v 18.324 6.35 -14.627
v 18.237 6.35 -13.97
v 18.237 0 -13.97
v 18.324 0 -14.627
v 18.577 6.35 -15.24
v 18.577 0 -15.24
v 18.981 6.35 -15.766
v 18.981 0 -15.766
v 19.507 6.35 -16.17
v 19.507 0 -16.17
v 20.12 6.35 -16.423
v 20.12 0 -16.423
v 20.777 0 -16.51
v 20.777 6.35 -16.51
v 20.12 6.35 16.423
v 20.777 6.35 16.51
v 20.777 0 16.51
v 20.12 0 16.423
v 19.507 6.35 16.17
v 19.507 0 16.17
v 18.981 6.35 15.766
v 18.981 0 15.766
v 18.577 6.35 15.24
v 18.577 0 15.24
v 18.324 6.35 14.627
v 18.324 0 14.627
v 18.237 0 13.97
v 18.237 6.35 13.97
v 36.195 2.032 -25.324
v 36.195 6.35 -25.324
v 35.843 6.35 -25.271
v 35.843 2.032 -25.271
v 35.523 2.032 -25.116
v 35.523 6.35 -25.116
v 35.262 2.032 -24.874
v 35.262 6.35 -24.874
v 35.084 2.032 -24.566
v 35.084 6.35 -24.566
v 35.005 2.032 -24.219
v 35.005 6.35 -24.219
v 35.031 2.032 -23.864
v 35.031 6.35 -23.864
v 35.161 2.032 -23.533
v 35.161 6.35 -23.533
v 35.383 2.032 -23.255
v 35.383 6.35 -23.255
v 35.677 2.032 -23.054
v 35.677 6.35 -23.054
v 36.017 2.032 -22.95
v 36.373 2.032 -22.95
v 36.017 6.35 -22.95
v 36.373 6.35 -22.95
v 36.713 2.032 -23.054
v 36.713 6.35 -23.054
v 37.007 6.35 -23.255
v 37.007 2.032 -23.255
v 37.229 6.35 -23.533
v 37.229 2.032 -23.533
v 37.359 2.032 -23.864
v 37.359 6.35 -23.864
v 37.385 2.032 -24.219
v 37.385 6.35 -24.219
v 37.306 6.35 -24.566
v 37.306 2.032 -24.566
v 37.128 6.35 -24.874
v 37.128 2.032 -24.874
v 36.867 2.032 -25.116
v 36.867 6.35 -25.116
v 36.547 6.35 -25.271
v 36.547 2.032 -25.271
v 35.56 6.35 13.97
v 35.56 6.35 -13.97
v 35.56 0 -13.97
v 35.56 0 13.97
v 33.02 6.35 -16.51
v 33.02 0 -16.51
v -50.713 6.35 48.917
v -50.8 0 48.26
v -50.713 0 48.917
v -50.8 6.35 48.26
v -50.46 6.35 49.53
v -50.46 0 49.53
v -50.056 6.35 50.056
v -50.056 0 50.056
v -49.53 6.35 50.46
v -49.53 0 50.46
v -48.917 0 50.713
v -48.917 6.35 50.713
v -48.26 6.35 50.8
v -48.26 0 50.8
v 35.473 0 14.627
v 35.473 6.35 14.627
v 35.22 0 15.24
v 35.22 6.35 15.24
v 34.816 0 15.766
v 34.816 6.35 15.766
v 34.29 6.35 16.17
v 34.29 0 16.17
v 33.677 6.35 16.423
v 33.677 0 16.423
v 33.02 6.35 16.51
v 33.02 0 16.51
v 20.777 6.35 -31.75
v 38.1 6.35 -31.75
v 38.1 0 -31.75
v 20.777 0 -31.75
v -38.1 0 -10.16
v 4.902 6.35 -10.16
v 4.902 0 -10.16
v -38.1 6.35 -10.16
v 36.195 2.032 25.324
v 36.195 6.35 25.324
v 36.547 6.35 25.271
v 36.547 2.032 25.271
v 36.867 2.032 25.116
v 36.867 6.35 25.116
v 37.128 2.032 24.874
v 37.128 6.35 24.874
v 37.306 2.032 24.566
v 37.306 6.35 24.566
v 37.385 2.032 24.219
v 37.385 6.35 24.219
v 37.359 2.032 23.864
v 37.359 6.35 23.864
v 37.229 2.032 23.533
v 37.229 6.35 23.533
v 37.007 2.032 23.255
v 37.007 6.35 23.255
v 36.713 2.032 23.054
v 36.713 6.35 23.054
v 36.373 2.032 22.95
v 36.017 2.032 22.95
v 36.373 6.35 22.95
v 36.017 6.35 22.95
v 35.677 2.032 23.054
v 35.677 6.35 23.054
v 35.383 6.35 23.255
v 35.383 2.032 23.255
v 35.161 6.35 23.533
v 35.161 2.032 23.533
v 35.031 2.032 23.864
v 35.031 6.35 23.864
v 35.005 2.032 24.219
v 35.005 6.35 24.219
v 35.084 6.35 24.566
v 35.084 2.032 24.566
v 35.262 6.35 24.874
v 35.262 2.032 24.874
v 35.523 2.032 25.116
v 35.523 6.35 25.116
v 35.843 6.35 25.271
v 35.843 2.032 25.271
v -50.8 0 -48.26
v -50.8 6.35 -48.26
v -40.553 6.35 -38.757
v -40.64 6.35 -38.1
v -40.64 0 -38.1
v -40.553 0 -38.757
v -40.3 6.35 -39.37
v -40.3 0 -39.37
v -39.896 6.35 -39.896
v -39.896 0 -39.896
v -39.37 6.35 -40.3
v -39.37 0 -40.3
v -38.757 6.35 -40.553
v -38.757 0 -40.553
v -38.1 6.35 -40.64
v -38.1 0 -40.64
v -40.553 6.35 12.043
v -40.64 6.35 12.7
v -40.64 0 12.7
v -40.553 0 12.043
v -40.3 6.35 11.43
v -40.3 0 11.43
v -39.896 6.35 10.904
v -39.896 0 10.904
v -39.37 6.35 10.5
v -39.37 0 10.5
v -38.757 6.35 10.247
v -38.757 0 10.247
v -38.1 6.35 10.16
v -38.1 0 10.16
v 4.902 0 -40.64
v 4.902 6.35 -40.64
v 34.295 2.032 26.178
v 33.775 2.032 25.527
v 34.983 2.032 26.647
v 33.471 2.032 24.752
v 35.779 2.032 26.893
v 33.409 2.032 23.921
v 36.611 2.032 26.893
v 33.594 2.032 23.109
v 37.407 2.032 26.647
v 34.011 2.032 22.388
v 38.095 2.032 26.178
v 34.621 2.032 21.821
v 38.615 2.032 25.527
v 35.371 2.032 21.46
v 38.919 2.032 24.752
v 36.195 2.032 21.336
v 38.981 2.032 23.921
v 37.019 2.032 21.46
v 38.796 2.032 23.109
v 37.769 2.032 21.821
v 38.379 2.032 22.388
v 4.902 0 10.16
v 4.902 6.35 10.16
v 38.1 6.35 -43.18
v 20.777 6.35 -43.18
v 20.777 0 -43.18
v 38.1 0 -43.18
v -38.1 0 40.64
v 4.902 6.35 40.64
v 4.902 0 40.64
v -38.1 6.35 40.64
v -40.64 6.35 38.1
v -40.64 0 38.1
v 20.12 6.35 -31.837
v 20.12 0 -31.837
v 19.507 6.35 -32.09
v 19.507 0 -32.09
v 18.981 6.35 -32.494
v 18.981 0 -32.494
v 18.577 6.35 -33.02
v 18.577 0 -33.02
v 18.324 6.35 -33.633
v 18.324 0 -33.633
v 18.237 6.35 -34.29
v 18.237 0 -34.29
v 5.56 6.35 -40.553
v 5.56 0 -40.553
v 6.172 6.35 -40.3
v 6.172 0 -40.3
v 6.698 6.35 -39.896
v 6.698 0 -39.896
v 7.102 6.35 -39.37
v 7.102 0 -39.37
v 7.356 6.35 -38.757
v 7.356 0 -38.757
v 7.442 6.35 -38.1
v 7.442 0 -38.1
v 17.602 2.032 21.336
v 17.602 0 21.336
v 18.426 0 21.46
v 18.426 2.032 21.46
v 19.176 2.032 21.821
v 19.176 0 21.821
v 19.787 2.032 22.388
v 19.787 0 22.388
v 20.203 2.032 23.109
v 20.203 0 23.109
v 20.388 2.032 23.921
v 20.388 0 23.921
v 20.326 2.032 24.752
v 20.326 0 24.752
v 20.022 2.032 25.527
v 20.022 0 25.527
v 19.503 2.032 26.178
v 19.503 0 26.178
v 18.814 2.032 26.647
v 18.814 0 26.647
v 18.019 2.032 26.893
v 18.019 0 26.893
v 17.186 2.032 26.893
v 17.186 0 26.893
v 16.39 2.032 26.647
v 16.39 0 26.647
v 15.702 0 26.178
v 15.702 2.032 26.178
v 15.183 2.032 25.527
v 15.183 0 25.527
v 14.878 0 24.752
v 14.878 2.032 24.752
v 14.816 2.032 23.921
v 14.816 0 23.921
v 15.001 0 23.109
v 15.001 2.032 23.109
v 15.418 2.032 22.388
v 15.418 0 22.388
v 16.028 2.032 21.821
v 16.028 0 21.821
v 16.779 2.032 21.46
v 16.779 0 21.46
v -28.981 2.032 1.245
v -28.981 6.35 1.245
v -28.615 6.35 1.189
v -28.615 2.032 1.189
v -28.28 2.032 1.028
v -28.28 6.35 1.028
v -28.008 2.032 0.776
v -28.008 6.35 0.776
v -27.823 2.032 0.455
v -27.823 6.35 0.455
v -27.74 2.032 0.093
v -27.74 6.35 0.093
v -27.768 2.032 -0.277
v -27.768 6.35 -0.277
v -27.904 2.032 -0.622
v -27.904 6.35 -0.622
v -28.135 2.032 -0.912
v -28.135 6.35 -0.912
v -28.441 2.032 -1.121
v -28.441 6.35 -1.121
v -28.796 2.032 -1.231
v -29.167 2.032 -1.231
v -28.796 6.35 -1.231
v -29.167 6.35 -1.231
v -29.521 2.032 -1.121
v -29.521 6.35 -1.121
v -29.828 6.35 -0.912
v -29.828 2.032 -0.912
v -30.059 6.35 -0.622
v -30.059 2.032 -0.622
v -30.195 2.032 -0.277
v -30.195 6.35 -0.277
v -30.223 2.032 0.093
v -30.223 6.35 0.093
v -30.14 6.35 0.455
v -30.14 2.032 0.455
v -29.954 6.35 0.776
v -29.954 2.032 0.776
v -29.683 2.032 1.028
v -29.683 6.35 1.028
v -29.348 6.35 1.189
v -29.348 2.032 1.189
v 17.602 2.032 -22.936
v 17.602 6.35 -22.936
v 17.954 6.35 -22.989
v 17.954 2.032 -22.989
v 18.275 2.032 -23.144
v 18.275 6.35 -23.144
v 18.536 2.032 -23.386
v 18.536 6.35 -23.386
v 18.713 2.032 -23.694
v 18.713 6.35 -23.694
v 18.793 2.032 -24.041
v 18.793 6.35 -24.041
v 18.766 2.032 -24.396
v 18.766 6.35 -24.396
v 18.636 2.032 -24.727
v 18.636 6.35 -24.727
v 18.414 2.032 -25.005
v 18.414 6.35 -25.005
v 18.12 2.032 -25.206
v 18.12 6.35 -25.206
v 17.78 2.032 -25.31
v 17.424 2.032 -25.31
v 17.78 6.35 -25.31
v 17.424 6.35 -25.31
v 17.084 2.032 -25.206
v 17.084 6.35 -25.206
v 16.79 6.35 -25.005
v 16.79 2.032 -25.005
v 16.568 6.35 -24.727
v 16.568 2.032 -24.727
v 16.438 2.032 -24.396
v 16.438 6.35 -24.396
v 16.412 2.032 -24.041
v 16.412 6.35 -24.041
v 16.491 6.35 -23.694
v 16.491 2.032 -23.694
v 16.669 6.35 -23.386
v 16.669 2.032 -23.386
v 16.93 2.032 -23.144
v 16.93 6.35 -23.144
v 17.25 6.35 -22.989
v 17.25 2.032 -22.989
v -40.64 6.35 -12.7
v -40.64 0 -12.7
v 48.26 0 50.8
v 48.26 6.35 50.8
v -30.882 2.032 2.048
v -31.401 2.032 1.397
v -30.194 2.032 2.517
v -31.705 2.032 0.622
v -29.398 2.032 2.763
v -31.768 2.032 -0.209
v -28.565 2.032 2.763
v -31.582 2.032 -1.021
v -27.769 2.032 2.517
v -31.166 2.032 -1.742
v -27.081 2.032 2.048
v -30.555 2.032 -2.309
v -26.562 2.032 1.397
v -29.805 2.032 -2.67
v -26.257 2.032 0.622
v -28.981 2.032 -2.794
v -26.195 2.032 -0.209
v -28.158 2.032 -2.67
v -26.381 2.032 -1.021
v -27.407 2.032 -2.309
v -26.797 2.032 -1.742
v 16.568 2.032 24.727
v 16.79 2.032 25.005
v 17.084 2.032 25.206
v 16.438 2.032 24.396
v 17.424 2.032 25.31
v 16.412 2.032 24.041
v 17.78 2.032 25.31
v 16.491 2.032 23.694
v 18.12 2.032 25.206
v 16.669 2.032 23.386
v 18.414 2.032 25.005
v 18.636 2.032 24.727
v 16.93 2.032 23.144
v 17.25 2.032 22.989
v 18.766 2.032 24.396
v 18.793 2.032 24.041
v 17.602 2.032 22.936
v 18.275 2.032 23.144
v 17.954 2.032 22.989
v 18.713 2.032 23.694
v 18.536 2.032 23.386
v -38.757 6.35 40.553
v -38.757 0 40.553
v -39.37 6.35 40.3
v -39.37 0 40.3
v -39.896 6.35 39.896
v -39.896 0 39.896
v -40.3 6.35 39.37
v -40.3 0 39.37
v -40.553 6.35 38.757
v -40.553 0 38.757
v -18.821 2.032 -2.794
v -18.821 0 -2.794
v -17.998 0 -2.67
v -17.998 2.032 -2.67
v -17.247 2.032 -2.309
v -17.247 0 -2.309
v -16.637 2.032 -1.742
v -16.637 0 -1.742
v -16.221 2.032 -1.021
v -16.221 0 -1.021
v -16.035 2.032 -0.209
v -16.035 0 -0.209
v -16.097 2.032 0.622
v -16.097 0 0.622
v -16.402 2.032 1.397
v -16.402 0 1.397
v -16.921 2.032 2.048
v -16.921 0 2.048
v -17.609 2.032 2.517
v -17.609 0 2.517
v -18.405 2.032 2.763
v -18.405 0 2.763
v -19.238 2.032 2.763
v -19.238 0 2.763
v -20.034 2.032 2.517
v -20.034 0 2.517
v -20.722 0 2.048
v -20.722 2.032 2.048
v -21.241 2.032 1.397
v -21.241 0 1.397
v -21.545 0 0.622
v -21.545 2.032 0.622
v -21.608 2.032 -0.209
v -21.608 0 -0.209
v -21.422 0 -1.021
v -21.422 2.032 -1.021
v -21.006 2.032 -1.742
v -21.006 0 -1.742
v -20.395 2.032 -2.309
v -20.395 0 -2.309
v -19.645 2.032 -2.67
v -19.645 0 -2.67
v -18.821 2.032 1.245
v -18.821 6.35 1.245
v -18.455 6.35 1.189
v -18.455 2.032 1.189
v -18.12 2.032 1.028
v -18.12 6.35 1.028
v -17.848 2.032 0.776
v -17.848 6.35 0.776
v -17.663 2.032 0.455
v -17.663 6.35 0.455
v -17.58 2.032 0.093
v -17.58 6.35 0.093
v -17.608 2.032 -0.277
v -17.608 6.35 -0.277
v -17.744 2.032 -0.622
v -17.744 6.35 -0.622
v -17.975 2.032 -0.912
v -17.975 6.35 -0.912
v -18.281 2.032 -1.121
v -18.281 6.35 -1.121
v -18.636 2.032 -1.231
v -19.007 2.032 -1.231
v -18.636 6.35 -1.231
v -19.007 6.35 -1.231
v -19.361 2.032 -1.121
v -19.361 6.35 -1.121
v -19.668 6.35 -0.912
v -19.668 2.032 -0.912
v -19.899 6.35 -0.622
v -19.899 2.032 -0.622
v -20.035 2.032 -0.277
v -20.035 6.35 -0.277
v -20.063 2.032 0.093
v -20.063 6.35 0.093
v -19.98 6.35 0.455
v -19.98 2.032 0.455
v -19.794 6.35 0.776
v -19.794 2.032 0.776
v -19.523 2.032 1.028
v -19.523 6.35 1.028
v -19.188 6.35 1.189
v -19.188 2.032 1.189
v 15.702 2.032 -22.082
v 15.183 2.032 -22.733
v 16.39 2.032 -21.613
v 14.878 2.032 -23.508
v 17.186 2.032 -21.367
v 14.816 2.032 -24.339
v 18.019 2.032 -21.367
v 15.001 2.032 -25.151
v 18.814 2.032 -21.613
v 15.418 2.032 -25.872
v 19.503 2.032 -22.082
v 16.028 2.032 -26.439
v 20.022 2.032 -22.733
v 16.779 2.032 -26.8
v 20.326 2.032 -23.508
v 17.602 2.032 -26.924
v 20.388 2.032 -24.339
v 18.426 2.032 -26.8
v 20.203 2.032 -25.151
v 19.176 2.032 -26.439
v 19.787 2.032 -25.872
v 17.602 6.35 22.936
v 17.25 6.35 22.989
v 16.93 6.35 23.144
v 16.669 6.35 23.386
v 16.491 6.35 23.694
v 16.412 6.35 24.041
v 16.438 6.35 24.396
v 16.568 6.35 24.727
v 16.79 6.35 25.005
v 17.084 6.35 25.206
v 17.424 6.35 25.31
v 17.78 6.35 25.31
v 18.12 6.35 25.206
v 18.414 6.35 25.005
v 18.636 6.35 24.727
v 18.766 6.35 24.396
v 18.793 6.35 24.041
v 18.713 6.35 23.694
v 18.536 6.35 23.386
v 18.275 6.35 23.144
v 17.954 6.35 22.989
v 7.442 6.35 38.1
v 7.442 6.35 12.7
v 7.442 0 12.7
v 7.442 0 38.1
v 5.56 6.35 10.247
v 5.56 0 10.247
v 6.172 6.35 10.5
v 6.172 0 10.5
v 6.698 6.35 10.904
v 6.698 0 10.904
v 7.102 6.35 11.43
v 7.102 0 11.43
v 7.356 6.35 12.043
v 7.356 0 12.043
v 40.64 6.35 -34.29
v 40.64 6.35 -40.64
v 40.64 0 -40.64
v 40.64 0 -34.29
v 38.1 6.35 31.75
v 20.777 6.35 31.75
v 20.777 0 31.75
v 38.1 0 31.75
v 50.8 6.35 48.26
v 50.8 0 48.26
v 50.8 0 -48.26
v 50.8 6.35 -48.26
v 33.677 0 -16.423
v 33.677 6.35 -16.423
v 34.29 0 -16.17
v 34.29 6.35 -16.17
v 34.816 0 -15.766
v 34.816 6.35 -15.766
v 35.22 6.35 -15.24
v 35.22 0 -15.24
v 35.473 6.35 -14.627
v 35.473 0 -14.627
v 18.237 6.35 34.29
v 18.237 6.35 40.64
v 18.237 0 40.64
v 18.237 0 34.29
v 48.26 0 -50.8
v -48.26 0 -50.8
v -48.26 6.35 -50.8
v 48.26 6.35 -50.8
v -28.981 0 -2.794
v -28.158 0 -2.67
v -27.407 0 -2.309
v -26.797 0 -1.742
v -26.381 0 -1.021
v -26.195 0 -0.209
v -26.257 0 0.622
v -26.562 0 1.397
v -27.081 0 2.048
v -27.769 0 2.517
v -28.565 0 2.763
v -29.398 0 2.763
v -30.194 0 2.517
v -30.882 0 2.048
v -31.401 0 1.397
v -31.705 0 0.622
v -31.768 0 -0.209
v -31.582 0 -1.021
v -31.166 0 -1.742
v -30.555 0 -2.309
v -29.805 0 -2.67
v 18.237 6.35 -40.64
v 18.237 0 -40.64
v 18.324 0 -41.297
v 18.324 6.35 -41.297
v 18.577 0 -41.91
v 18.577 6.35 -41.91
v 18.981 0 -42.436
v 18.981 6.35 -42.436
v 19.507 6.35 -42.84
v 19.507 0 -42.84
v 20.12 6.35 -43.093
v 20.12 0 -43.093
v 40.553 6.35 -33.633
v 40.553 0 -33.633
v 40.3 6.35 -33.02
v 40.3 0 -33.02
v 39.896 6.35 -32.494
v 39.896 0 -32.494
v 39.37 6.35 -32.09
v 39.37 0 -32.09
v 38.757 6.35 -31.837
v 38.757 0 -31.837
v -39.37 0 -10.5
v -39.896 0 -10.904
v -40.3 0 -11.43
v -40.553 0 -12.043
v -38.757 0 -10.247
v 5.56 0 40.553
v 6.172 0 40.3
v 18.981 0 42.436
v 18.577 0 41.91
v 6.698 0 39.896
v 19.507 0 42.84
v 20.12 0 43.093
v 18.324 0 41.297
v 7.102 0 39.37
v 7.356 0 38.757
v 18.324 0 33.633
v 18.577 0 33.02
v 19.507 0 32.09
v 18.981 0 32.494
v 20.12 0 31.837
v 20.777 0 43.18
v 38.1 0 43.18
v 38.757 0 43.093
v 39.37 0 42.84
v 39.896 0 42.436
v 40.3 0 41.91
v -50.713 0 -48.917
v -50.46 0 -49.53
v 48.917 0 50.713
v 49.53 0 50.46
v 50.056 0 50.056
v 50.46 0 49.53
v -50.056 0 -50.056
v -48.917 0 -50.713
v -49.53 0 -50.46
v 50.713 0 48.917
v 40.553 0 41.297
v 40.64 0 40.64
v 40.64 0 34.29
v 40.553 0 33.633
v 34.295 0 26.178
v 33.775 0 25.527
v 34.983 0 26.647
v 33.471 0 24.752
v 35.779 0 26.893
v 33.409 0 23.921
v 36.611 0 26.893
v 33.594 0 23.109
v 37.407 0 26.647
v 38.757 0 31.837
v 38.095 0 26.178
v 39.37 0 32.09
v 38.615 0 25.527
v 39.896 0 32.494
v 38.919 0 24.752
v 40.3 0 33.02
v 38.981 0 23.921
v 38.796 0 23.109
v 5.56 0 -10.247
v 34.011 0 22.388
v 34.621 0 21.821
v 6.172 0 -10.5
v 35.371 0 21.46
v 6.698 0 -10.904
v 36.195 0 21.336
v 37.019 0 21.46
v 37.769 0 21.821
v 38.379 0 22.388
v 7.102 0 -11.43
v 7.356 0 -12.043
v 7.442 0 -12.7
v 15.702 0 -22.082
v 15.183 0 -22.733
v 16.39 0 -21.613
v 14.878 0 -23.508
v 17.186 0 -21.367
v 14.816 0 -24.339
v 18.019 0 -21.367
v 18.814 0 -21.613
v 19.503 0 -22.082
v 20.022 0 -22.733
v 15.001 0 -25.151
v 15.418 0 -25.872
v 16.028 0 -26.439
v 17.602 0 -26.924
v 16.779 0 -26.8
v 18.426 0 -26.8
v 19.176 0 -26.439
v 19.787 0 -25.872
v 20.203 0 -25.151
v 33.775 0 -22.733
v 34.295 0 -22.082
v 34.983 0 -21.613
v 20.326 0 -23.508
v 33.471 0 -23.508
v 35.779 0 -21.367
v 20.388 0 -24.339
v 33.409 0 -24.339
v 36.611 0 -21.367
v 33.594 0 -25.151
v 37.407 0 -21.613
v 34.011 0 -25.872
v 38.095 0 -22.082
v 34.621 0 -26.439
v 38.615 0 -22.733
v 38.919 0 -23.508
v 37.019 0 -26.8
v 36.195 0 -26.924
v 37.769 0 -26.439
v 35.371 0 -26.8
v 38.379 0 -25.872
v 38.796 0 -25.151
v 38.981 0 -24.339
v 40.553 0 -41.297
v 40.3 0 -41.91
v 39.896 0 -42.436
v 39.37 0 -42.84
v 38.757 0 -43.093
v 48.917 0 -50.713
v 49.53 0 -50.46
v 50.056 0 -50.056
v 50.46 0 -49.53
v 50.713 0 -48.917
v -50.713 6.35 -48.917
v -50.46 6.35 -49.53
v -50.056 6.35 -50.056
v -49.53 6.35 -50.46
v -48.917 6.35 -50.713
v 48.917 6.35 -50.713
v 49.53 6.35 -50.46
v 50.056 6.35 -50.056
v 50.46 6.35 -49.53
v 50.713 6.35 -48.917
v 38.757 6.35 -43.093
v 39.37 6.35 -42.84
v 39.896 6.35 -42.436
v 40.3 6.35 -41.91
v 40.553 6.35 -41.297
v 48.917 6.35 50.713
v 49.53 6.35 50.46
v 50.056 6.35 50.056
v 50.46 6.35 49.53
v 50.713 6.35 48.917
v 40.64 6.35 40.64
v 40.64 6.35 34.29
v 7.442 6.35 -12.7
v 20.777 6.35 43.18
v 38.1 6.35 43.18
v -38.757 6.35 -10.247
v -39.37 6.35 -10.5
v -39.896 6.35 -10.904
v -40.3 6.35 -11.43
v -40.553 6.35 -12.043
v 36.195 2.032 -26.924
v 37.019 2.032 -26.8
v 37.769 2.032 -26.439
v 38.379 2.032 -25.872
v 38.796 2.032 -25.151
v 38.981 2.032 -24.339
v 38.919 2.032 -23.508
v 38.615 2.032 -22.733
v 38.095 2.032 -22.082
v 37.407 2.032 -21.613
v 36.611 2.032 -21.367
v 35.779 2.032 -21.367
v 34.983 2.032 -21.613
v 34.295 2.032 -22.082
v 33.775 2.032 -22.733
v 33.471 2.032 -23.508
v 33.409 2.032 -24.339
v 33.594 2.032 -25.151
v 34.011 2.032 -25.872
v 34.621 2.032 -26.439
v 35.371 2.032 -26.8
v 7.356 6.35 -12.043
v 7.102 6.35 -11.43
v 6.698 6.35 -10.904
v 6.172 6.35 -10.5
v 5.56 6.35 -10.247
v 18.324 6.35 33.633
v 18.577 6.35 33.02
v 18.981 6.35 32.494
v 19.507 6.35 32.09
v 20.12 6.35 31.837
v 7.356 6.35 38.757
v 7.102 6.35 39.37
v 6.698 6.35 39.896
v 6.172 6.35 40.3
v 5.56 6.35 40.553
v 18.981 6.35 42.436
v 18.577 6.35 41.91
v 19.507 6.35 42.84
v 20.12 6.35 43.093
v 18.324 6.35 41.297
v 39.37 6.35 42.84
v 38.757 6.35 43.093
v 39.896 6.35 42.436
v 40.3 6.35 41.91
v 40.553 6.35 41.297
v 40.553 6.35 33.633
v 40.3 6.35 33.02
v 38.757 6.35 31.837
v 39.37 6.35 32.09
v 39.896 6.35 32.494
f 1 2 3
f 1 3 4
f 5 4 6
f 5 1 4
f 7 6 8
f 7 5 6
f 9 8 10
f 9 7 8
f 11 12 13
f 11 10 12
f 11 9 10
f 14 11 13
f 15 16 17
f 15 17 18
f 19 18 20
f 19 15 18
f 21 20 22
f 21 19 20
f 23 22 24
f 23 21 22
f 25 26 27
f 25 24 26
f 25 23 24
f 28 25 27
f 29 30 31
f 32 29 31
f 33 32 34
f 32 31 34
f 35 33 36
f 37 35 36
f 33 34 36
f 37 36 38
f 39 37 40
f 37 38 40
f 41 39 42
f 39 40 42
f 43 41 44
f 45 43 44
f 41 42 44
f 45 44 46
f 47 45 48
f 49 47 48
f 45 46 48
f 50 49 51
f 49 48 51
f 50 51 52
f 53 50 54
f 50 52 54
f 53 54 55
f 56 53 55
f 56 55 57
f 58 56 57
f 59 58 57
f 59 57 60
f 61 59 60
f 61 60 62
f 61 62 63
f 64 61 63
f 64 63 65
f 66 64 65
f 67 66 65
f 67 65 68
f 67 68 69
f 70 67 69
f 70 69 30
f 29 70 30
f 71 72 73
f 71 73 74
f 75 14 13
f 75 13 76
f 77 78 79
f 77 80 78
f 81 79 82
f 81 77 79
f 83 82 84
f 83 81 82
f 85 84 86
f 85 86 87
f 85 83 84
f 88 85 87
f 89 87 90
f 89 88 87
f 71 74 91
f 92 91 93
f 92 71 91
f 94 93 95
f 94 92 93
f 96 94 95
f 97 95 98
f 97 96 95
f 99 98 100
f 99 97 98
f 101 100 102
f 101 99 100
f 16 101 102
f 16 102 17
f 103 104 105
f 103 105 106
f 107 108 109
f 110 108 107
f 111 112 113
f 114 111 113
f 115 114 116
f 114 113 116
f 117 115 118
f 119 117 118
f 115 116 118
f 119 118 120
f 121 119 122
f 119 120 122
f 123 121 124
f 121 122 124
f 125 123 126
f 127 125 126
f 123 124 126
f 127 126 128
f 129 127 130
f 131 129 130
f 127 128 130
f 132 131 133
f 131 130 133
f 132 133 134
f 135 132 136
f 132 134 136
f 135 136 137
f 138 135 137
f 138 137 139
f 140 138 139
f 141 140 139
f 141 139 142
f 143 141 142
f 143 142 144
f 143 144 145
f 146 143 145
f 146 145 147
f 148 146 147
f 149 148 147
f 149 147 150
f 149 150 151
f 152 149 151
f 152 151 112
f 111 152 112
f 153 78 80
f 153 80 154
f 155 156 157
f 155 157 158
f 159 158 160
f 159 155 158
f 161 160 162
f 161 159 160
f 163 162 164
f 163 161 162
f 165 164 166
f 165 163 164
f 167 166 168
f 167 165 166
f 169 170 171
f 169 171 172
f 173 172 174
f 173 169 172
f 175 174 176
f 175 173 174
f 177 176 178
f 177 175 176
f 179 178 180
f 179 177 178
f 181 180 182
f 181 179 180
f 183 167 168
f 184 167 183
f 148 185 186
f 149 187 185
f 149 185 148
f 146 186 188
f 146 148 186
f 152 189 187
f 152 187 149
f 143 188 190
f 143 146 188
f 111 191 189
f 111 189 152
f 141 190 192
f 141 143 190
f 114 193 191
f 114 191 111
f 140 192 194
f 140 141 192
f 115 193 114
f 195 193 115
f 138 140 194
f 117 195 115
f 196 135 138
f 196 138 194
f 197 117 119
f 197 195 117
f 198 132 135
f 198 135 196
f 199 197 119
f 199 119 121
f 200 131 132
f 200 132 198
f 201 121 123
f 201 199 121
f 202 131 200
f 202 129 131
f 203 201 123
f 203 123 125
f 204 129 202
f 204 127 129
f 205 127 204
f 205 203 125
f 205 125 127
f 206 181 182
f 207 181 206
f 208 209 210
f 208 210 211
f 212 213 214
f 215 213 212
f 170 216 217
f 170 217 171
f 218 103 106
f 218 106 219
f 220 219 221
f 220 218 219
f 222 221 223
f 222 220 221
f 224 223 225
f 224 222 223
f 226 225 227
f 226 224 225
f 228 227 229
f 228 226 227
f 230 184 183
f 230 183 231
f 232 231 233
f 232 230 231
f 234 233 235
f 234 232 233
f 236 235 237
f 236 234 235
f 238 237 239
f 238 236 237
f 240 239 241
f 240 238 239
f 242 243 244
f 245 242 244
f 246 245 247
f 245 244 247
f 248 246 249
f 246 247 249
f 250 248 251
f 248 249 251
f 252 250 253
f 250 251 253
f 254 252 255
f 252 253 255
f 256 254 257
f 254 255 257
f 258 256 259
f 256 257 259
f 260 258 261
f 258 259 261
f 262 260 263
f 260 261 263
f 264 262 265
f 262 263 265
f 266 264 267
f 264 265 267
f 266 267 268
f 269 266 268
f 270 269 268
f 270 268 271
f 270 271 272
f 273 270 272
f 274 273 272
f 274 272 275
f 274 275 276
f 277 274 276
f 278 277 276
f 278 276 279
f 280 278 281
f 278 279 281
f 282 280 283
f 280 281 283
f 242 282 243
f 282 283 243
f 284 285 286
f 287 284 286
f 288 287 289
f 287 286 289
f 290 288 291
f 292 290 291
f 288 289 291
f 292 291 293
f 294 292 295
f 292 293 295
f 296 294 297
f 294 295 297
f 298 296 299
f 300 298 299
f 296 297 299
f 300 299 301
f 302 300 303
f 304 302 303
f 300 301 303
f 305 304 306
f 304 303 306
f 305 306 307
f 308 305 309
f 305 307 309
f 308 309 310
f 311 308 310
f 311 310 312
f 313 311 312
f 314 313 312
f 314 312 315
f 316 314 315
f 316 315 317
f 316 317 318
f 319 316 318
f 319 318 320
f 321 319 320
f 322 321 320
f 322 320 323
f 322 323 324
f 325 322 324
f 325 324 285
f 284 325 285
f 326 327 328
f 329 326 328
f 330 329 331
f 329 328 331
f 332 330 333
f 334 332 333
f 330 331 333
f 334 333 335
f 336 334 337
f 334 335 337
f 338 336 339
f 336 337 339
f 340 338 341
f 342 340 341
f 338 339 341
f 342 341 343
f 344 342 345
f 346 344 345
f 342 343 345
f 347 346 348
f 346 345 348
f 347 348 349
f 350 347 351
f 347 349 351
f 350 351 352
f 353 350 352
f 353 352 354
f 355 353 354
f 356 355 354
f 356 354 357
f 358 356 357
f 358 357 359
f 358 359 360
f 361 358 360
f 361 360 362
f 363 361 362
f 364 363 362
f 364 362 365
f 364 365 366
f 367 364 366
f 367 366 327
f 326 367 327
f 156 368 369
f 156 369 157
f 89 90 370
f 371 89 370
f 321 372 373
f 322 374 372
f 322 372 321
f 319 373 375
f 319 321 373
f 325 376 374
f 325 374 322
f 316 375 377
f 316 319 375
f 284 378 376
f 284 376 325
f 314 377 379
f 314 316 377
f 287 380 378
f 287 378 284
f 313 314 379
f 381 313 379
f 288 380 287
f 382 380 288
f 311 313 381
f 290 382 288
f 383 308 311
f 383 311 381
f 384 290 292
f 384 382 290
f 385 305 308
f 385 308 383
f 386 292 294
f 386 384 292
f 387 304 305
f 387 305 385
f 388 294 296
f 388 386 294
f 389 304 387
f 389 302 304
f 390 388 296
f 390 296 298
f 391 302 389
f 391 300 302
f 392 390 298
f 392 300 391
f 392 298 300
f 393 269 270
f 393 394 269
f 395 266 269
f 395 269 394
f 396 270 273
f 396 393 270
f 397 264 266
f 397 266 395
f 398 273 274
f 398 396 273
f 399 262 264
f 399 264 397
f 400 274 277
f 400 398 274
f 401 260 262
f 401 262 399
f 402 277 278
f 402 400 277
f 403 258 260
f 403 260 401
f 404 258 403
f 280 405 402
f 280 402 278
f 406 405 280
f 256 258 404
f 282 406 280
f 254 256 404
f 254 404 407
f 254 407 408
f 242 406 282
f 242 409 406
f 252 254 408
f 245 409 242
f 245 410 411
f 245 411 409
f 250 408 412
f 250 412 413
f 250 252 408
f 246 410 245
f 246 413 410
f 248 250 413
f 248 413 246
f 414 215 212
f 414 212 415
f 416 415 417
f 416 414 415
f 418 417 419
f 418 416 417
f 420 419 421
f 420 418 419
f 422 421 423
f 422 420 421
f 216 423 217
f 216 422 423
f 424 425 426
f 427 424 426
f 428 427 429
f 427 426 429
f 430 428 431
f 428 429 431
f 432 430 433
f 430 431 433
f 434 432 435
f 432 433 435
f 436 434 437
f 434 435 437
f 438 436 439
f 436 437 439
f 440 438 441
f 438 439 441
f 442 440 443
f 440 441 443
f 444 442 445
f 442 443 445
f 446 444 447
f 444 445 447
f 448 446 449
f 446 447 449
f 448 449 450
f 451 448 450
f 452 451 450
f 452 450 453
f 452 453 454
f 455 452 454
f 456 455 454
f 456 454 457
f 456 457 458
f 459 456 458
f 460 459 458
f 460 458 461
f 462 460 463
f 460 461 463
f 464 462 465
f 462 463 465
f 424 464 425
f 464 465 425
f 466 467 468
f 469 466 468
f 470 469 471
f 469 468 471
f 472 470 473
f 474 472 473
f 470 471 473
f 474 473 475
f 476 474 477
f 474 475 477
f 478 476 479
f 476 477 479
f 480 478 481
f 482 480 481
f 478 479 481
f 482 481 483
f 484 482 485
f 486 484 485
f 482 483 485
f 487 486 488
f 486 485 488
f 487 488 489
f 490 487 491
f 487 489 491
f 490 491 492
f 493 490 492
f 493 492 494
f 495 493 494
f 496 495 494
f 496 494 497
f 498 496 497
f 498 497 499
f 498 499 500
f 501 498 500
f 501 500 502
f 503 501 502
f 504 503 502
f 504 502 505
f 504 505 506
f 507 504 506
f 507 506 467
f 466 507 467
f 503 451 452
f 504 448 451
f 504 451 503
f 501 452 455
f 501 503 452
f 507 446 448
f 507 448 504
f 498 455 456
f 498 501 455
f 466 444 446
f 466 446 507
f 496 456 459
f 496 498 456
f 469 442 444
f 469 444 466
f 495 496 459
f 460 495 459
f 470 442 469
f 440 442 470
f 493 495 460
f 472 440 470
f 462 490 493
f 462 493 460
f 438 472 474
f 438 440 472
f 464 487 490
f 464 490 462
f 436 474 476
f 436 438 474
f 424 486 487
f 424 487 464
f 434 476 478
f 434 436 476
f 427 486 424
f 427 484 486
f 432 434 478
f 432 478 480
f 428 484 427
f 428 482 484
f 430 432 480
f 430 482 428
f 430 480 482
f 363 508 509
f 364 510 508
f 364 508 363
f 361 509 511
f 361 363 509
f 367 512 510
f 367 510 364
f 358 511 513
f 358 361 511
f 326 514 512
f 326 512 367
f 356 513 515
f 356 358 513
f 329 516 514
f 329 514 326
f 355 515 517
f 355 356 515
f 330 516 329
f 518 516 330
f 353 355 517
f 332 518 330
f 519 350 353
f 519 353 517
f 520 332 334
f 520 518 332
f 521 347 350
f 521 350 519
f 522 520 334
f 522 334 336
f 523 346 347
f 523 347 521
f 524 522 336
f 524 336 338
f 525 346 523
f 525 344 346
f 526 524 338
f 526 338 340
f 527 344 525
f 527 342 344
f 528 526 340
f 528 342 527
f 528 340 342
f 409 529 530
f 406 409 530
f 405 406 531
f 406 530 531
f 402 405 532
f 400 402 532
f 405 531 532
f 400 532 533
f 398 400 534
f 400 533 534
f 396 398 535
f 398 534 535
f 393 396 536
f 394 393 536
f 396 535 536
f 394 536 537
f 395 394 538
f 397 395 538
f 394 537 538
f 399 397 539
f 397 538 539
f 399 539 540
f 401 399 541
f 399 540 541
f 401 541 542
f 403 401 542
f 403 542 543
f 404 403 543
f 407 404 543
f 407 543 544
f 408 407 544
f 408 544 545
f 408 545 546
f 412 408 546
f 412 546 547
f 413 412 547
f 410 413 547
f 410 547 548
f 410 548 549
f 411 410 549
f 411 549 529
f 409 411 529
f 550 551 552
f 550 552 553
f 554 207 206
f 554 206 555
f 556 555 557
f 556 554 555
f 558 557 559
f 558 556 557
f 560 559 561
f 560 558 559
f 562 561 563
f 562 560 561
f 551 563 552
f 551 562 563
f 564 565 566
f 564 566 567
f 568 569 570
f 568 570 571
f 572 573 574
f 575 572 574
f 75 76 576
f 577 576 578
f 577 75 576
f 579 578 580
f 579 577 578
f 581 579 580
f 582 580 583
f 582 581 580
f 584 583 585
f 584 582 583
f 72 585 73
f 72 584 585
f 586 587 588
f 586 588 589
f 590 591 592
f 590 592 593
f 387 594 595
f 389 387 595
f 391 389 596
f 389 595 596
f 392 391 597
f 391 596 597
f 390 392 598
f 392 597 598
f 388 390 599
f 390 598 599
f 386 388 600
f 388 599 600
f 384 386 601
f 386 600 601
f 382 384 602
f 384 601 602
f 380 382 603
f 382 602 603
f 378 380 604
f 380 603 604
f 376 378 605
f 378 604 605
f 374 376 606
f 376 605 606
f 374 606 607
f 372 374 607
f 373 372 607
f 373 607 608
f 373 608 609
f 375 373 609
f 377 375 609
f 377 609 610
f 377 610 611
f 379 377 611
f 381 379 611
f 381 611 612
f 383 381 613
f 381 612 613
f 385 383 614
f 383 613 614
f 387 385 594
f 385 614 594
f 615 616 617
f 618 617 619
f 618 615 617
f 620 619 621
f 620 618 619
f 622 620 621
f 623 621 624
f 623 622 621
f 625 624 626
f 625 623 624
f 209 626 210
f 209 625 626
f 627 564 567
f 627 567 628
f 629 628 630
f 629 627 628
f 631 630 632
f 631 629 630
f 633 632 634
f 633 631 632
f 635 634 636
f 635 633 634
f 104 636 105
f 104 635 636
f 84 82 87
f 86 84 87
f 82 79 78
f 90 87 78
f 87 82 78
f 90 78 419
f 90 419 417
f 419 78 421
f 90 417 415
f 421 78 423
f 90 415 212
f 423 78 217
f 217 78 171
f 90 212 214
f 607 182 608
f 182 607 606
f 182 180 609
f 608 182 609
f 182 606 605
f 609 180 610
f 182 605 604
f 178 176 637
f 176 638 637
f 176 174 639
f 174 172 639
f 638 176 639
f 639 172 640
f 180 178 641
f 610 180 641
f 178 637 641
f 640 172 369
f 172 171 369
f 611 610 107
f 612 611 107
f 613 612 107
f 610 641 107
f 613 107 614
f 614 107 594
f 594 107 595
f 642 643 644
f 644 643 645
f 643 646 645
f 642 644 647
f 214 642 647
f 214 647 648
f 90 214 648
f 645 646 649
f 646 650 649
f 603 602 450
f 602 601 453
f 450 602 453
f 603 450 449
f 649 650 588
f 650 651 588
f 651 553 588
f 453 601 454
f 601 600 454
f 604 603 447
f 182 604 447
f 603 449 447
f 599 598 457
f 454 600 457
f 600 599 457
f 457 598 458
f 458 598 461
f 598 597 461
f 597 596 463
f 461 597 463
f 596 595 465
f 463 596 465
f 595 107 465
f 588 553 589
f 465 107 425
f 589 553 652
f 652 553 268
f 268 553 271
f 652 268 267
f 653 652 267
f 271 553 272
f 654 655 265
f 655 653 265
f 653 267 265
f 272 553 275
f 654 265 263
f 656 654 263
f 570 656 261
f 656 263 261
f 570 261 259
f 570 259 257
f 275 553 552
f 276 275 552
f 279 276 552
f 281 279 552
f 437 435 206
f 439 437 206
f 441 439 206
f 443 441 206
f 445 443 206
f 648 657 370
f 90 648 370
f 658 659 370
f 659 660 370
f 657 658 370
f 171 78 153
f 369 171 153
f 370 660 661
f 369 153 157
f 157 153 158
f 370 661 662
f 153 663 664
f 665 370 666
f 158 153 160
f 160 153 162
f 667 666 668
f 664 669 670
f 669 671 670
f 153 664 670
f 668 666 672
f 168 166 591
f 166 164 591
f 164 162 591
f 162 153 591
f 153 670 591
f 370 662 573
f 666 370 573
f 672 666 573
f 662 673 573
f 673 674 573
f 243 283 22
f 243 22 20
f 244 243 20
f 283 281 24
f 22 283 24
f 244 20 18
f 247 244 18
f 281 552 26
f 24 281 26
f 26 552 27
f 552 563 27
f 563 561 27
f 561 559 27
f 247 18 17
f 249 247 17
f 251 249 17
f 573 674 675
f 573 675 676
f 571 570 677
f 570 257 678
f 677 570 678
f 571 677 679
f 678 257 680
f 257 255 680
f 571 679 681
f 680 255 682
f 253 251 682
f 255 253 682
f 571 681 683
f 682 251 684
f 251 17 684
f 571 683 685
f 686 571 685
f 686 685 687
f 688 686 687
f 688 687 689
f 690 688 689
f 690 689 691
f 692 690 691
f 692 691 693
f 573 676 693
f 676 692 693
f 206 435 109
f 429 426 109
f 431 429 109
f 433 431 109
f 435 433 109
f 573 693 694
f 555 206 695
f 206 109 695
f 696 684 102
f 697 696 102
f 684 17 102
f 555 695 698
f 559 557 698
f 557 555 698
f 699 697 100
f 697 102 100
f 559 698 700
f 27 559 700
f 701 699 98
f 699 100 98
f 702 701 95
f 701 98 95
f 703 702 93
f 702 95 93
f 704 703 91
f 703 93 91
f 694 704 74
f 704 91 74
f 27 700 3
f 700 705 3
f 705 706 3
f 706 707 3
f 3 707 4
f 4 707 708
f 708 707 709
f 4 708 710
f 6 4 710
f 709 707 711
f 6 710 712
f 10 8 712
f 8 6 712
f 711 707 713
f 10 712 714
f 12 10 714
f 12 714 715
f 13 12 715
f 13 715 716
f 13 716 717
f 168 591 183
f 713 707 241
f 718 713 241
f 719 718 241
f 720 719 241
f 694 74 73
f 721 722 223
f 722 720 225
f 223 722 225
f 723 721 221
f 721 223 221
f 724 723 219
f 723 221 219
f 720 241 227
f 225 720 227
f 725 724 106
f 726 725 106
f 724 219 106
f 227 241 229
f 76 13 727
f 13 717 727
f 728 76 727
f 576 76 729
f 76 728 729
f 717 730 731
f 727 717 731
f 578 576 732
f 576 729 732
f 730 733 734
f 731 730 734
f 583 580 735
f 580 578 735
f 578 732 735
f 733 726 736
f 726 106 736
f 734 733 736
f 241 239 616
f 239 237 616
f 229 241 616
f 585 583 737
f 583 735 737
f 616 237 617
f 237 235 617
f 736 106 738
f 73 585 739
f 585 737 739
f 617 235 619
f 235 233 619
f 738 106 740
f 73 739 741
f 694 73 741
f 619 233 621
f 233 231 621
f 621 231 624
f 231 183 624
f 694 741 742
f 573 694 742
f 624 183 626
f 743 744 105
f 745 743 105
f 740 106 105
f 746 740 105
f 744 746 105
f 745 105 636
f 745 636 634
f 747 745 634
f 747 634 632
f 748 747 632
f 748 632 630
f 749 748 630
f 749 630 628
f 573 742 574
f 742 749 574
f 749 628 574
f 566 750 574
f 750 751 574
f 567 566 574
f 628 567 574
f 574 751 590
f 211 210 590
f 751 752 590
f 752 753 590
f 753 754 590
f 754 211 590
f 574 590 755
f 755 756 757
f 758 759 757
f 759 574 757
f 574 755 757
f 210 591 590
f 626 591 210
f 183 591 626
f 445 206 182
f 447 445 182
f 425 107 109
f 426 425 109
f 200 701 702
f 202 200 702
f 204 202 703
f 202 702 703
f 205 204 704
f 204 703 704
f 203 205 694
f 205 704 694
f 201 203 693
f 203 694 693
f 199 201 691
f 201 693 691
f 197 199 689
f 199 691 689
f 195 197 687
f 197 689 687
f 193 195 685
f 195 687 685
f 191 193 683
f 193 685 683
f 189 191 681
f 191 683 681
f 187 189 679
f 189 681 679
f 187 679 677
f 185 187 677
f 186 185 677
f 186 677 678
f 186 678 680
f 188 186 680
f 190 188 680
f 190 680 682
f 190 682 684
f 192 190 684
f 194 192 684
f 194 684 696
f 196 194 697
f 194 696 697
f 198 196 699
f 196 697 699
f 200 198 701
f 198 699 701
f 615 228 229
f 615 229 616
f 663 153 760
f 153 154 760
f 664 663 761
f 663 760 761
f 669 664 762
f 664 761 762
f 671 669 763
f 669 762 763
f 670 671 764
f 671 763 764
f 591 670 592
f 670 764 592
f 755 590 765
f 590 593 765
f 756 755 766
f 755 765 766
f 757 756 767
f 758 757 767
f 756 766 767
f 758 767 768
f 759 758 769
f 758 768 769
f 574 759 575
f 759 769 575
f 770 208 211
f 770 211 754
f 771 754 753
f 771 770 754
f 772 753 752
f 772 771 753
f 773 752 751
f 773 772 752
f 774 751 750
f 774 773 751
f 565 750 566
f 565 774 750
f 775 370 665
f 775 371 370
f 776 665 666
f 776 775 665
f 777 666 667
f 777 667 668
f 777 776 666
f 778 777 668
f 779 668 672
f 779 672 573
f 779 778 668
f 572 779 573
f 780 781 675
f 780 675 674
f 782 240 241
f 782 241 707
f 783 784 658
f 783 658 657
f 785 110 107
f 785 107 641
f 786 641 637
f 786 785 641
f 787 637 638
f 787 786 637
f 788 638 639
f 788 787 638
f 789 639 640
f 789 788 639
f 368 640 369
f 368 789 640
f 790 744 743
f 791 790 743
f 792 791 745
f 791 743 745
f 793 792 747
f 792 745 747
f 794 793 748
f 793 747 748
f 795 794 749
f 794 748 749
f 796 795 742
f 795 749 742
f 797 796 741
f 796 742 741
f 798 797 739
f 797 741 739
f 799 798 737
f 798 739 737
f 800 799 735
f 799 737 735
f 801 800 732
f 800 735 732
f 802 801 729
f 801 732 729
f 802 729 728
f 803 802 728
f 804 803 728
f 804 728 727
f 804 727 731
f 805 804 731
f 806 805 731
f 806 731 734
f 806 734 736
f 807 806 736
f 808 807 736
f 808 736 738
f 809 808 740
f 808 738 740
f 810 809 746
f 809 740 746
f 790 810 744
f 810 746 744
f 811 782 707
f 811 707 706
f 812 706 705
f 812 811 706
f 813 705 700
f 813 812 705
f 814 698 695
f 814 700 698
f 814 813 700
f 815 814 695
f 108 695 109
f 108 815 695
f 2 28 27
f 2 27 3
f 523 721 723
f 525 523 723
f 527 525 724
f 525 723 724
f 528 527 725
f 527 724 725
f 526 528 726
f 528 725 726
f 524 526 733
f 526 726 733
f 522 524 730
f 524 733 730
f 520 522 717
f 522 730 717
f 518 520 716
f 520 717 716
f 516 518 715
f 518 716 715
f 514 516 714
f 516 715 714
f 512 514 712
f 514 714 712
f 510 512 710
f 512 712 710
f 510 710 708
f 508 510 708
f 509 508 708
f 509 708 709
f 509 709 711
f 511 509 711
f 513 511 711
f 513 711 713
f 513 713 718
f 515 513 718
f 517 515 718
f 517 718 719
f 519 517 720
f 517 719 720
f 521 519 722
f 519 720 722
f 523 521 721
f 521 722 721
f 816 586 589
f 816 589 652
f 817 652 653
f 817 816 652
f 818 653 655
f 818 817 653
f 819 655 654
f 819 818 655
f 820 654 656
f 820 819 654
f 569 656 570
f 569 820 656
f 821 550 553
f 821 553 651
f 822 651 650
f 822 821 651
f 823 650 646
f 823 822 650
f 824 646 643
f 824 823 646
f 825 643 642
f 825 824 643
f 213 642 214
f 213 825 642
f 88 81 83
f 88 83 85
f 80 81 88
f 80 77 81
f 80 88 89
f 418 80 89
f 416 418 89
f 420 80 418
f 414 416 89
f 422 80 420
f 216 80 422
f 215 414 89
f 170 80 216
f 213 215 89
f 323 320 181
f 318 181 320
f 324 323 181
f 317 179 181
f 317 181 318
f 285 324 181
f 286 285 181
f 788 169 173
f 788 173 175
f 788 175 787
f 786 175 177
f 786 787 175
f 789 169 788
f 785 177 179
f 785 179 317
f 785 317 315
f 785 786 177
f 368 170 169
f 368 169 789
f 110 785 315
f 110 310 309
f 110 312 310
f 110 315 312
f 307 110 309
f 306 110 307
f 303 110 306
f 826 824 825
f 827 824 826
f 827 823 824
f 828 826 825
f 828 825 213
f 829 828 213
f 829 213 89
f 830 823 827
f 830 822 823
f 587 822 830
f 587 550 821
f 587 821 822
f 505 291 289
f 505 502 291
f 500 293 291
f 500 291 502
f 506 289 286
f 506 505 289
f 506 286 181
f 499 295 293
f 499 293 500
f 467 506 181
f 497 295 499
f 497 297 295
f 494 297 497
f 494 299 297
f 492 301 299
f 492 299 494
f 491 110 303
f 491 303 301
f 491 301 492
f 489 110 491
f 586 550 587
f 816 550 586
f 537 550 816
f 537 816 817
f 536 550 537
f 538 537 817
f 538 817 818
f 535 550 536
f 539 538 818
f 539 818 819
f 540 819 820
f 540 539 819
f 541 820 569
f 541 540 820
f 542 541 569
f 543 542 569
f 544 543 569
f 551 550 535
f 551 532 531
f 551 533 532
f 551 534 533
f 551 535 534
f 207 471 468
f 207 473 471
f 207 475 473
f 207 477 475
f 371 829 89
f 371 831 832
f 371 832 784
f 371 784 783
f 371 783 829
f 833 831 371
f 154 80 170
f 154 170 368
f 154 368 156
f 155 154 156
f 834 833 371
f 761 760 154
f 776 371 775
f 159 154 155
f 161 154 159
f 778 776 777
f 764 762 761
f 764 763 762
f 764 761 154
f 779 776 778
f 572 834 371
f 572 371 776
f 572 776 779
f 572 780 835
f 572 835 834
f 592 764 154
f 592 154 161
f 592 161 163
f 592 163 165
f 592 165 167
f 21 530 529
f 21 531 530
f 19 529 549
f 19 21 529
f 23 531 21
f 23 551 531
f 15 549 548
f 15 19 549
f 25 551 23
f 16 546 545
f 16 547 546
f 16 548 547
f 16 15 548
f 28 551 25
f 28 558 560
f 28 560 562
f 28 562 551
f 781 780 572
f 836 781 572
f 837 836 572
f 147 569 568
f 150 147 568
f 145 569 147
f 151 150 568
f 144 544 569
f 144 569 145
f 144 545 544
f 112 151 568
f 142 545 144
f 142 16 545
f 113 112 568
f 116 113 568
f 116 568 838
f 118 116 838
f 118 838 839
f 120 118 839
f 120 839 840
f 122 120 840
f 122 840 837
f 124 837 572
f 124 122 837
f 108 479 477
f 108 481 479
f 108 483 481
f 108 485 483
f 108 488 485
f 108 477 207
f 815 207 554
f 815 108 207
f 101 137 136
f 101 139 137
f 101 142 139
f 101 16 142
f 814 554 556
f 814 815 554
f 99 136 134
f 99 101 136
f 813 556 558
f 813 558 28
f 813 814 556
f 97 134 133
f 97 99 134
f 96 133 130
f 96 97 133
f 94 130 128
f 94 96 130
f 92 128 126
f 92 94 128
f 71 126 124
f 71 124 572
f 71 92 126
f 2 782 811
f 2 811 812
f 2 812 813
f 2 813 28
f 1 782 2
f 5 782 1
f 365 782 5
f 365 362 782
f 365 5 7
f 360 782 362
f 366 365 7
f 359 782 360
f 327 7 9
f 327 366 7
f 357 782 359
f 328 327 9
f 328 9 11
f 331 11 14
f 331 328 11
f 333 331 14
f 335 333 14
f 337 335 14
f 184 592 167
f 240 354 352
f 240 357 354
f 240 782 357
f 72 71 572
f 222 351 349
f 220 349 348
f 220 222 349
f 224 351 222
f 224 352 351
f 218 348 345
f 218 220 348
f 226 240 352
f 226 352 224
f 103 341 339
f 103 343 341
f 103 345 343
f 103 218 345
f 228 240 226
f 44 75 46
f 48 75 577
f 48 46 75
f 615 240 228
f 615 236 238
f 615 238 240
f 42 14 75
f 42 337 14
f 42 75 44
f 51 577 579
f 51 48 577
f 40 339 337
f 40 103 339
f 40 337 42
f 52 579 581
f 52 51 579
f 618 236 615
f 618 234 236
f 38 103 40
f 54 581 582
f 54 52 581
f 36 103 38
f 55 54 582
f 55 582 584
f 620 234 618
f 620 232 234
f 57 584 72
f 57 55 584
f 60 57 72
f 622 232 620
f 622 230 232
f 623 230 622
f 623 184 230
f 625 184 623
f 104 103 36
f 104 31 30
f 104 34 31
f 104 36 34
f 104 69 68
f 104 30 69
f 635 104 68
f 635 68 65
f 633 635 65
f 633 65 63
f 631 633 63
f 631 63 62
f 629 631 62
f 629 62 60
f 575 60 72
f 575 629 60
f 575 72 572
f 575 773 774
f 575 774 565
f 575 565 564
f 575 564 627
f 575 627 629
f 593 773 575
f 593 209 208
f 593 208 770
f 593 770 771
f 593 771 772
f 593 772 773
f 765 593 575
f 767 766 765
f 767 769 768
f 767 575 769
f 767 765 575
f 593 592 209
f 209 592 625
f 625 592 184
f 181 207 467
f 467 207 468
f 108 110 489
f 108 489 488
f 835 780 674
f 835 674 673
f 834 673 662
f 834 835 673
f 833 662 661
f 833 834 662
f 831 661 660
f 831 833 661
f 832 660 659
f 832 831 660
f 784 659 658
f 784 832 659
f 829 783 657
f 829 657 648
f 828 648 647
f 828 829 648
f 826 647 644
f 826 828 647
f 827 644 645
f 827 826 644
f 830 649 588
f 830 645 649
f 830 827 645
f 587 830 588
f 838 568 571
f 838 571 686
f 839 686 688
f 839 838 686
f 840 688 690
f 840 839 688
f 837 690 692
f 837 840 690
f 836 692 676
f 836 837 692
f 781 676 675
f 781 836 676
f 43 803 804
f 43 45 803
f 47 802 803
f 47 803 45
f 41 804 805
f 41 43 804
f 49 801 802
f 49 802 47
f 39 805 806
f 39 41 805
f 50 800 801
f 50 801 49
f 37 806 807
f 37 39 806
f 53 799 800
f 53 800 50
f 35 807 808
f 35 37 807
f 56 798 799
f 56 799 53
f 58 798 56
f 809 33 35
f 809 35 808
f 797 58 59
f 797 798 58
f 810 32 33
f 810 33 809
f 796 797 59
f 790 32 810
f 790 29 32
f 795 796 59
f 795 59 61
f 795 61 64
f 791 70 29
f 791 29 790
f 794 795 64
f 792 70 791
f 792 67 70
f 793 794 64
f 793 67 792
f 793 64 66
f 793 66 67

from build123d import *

# Parameters (mm, degrees)
BASE_W              = 101.6
BASE_H              = 101.6
BOSS_EXTRUDE2_DEPTH = 6.35
SKETCH1_R           = 1.1938
SKETCH1_R_2         = 1.2446
CUT_EXTRUDE1_DEPTH  = 73.122135992
FILLET1_R           = 2.54
SKETCH2_R           = 2.794
CUT_EXTRUDE2_DEPTH  = 2.032
CUT_EXTRUDE3_DEPTH  = 73.122135992


with BuildPart() as part:
    # Base → Boss-Extrude2 (new body)
    with BuildSketch(Plane(origin=(0, 0, 0), x_dir=(1, 0, 0), z_dir=(0, 1, 0))):
        Rectangle(BASE_W, BASE_H)
    extrude(amount=BOSS_EXTRUDE2_DEPTH)

    # Sketch1 → Cut-Extrude1 (cut, through all)
    with BuildSketch(Plane(origin=(0, 6.35, 0), x_dir=(1, 0, 0), z_dir=(0, 1, 0))):
        with Locations(Location((17.6022, 24.13, 0), (0, 0, 270))):
            Circle(SKETCH1_R)
        with Locations(Location((36.195, 24.13, 0), (0, 0, 90))):
            Circle(SKETCH1_R)
        with Locations(Location((17.6022, -24.13, 0), (0, 0, 90))):
            Circle(SKETCH1_R)
        with Locations(Location((36.195, -24.13, 0), (0, 0, 270))):
            Circle(SKETCH1_R)
        with Locations(Location((-28.9814, 0, 0), (0, 0, 270))):
            Circle(SKETCH1_R_2)
        with Locations(Location((-18.8214, 0, 0), (0, 0, 270))):
            Circle(SKETCH1_R_2)
    extrude(amount=-CUT_EXTRUDE1_DEPTH, mode=Mode.SUBTRACT)

    # Fillet1
    fillet1_edges = [part.edges().sort_by_distance(p)[0] for p in [
        (50.8, 3.175, 50.8),
        (-50.8, 3.175, 50.8),
        (-50.8, 3.175, -50.8),
        (50.8, 3.175, -50.8),
    ]]
    fillet(fillet1_edges, radius=FILLET1_R)

    # Sketch2 → Cut-Extrude2 (cut)
    with BuildSketch(Plane.XZ):
        with Locations(Location((17.6022, 24.13, 0), (0, 0, 270))):
            Circle(SKETCH2_R)
        with Locations(Location((36.195, 24.13, 0), (0, 0, 270))):
            Circle(SKETCH2_R)
        with Locations(Location((36.195, -24.13, 0), (0, 0, 270))):
            Circle(SKETCH2_R)
        with Locations(Location((17.6022, -24.13, 0), (0, 0, 270))):
            Circle(SKETCH2_R)
        with Locations(Location((-18.8214, 0, 0), (0, 0, 270))):
            Circle(SKETCH2_R)
        with Locations(Location((-28.9814, 0, 0), (0, 0, 270))):
            Circle(SKETCH2_R)
    extrude(amount=-CUT_EXTRUDE2_DEPTH, mode=Mode.SUBTRACT)

    # Sketch3 → Cut-Extrude3 (cut, through all)
    with BuildSketch(Plane(origin=(0, 6.35, 0), x_dir=(1, 0, 0), z_dir=(0, 1, 0))):
        with BuildLine():
            Line((-38.1, -10.16), (4.9022, -10.16))
            ThreePointArc((4.9022, -10.16), (6.698251224, -10.903948776), (7.4422, -12.7))
            Line((7.4422, -12.7), (7.4422, -38.1))
            ThreePointArc((7.4422, -38.1), (6.698251224, -39.896051224), (4.9022, -40.64))
            Line((4.9022, -40.64), (-38.1, -40.64))
            ThreePointArc((-38.1, -40.64), (-39.896051224, -39.896051224), (-40.64, -38.1))
            Line((-40.64, -38.1), (-40.64, -12.7))
            ThreePointArc((-40.64, -12.7), (-39.896051224, -10.903948776), (-38.1, -10.16))
        make_face()
        with BuildLine():
            Line((-38.1, 40.64), (4.9022, 40.64))
            ThreePointArc((4.9022, 40.64), (6.698251224, 39.896051224), (7.4422, 38.1))
            Line((7.4422, 38.1), (7.4422, 12.7))
            ThreePointArc((7.4422, 12.7), (6.698251224, 10.903948776), (4.9022, 10.16))
            Line((4.9022, 10.16), (-38.1, 10.16))
            ThreePointArc((-38.1, 10.16), (-39.896051224, 10.903948776), (-40.64, 12.7))
            Line((-40.64, 12.7), (-40.64, 38.1))
            ThreePointArc((-40.64, 38.1), (-39.896051224, 39.896051224), (-38.1, 40.64))
        make_face()
        with BuildLine():
            Line((20.7772, 16.51), (33.02, 16.51))
            ThreePointArc((33.02, 16.51), (34.816051224, 15.766051224), (35.56, 13.97))
            Line((35.56, 13.97), (35.56, -13.97))
            ThreePointArc((35.56, -13.97), (34.816051224, -15.766051224), (33.02, -16.51))
            Line((33.02, -16.51), (20.7772, -16.51))
            ThreePointArc((20.7772, -16.51), (18.981148776, -15.766051224), (18.2372, -13.97))
            Line((18.2372, -13.97), (18.2372, 13.97))
            ThreePointArc((18.2372, 13.97), (18.981148776, 15.766051224), (20.7772, 16.51))
        make_face()
        with BuildLine():
            Line((20.7772, 43.18), (38.1, 43.18))
            ThreePointArc((38.1, 43.18), (39.896051224, 42.436051224), (40.64, 40.64))
            Line((40.64, 40.64), (40.64, 34.29))
            ThreePointArc((40.64, 34.29), (39.896051224, 32.493948776), (38.1, 31.75))
            Line((38.1, 31.75), (20.7772, 31.75))
            ThreePointArc((20.7772, 31.75), (18.981148776, 32.493948776), (18.2372, 34.29))
            Line((18.2372, 34.29), (18.2372, 40.64))
            ThreePointArc((18.2372, 40.64), (18.981148776, 42.436051224), (20.7772, 43.18))
        make_face()
        with BuildLine():
            Line((20.7772, -31.75), (38.1, -31.75))
            ThreePointArc((38.1, -31.75), (39.896051224, -32.493948776), (40.64, -34.29))
            Line((40.64, -34.29), (40.64, -40.64))
            ThreePointArc((40.64, -40.64), (39.896051224, -42.436051224), (38.1, -43.18))
            Line((38.1, -43.18), (20.7772, -43.18))
            ThreePointArc((20.7772, -43.18), (18.981148776, -42.436051224), (18.2372, -40.64))
            Line((18.2372, -40.64), (18.2372, -34.29))
            ThreePointArc((18.2372, -34.29), (18.981148776, -32.493948776), (20.7772, -31.75))
        make_face()
    extrude(amount=-CUT_EXTRUDE3_DEPTH, mode=Mode.SUBTRACT)


solid = part.part
